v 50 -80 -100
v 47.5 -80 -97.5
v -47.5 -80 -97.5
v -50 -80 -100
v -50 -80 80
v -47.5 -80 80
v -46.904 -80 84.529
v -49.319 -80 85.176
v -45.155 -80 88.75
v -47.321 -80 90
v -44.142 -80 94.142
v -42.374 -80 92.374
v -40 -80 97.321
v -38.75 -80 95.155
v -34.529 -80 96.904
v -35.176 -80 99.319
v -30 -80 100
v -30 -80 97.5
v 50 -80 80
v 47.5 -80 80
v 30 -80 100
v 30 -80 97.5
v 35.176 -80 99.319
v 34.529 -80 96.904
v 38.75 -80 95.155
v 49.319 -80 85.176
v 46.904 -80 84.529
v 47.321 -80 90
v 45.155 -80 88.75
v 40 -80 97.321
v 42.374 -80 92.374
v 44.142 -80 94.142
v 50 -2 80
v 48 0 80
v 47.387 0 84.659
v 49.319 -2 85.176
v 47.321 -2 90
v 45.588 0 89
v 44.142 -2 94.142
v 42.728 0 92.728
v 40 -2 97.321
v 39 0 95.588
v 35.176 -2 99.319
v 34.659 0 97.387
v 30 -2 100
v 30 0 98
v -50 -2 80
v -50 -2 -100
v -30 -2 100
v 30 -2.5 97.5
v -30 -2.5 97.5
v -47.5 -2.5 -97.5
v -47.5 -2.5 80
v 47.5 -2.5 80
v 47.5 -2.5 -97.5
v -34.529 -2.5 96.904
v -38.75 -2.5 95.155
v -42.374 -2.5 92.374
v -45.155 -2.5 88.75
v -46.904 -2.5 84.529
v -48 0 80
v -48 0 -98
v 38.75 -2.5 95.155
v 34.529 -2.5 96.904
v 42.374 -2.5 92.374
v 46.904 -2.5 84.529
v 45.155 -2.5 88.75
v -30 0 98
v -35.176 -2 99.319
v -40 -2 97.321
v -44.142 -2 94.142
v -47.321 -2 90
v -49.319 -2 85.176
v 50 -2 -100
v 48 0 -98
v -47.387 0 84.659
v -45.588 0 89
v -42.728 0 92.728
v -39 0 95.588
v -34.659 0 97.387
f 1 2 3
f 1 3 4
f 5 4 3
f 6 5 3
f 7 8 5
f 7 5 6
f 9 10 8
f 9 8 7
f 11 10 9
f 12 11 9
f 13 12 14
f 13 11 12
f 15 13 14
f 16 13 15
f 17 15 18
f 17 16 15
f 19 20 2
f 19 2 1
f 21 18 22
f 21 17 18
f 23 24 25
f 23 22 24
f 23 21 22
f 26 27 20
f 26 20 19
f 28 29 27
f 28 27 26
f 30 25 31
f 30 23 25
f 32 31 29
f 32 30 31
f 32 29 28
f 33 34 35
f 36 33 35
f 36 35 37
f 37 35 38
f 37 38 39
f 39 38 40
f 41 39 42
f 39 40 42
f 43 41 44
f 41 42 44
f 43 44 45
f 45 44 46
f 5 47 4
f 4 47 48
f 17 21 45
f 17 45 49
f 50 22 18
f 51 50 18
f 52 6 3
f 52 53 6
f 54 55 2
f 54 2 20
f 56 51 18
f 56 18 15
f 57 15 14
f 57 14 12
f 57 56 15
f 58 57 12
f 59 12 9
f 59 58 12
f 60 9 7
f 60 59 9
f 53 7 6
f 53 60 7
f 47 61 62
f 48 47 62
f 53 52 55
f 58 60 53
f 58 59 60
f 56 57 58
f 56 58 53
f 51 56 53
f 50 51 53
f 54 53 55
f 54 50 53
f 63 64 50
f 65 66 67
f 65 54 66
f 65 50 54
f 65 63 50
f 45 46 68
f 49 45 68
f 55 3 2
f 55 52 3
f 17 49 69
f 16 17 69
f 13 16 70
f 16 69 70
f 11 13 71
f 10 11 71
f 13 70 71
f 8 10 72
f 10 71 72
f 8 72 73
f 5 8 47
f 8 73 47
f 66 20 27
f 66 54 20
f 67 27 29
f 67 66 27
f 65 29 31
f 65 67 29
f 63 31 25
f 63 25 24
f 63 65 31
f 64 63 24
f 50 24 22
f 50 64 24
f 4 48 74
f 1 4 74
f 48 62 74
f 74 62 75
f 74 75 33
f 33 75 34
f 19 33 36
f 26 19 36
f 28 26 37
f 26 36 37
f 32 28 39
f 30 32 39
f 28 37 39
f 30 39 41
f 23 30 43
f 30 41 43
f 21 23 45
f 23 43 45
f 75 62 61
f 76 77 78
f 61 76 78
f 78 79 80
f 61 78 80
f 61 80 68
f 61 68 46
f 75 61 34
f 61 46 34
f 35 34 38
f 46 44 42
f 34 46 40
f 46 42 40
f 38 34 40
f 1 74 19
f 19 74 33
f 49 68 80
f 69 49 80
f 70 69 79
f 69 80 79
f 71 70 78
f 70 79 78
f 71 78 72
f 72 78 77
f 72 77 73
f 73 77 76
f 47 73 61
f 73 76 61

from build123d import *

# Parameters (mm, degrees)
F1_DEPTH = 80
F2_T     = -2.5
F3_SIZE  = 2


with BuildPart() as f1:
    # F0 (on Front) → F1 (new body)
    with BuildSketch(Plane.XZ):
        with BuildLine():
            Line((30, 100), (-30, 100))
            ThreePointArc((-30, 100), (-44.142136, 94.142136), (-50, 80))
            Line((-50, 80), (-50, -100))
            Line((-50, -100), (50, -100))
            Line((50, -100), (50, 80))
            ThreePointArc((50, 80), (44.142136, 94.142136), (30, 100))
        make_face()
    extrude(amount=F1_DEPTH)

    # F2
    f2_openings = [f1.faces().sort_by_distance(p)[0] for p in [
        (0, -80, -0.82716),
    ]]
    offset(amount=F2_T, openings=f2_openings)

    # F3
    f3_edges = [f1.edges().sort_by_distance(p)[0] for p in [
        (50, 0, -10),
        (0, 0, 100),
        (-44.142136, 0, 94.142136),
        (-50, 0, -10),
        (0, 0, -100),
        (44.142136, 0, 94.142136),
    ]]
    chamfer(f3_edges, length=F3_SIZE)


solid = f1.part
